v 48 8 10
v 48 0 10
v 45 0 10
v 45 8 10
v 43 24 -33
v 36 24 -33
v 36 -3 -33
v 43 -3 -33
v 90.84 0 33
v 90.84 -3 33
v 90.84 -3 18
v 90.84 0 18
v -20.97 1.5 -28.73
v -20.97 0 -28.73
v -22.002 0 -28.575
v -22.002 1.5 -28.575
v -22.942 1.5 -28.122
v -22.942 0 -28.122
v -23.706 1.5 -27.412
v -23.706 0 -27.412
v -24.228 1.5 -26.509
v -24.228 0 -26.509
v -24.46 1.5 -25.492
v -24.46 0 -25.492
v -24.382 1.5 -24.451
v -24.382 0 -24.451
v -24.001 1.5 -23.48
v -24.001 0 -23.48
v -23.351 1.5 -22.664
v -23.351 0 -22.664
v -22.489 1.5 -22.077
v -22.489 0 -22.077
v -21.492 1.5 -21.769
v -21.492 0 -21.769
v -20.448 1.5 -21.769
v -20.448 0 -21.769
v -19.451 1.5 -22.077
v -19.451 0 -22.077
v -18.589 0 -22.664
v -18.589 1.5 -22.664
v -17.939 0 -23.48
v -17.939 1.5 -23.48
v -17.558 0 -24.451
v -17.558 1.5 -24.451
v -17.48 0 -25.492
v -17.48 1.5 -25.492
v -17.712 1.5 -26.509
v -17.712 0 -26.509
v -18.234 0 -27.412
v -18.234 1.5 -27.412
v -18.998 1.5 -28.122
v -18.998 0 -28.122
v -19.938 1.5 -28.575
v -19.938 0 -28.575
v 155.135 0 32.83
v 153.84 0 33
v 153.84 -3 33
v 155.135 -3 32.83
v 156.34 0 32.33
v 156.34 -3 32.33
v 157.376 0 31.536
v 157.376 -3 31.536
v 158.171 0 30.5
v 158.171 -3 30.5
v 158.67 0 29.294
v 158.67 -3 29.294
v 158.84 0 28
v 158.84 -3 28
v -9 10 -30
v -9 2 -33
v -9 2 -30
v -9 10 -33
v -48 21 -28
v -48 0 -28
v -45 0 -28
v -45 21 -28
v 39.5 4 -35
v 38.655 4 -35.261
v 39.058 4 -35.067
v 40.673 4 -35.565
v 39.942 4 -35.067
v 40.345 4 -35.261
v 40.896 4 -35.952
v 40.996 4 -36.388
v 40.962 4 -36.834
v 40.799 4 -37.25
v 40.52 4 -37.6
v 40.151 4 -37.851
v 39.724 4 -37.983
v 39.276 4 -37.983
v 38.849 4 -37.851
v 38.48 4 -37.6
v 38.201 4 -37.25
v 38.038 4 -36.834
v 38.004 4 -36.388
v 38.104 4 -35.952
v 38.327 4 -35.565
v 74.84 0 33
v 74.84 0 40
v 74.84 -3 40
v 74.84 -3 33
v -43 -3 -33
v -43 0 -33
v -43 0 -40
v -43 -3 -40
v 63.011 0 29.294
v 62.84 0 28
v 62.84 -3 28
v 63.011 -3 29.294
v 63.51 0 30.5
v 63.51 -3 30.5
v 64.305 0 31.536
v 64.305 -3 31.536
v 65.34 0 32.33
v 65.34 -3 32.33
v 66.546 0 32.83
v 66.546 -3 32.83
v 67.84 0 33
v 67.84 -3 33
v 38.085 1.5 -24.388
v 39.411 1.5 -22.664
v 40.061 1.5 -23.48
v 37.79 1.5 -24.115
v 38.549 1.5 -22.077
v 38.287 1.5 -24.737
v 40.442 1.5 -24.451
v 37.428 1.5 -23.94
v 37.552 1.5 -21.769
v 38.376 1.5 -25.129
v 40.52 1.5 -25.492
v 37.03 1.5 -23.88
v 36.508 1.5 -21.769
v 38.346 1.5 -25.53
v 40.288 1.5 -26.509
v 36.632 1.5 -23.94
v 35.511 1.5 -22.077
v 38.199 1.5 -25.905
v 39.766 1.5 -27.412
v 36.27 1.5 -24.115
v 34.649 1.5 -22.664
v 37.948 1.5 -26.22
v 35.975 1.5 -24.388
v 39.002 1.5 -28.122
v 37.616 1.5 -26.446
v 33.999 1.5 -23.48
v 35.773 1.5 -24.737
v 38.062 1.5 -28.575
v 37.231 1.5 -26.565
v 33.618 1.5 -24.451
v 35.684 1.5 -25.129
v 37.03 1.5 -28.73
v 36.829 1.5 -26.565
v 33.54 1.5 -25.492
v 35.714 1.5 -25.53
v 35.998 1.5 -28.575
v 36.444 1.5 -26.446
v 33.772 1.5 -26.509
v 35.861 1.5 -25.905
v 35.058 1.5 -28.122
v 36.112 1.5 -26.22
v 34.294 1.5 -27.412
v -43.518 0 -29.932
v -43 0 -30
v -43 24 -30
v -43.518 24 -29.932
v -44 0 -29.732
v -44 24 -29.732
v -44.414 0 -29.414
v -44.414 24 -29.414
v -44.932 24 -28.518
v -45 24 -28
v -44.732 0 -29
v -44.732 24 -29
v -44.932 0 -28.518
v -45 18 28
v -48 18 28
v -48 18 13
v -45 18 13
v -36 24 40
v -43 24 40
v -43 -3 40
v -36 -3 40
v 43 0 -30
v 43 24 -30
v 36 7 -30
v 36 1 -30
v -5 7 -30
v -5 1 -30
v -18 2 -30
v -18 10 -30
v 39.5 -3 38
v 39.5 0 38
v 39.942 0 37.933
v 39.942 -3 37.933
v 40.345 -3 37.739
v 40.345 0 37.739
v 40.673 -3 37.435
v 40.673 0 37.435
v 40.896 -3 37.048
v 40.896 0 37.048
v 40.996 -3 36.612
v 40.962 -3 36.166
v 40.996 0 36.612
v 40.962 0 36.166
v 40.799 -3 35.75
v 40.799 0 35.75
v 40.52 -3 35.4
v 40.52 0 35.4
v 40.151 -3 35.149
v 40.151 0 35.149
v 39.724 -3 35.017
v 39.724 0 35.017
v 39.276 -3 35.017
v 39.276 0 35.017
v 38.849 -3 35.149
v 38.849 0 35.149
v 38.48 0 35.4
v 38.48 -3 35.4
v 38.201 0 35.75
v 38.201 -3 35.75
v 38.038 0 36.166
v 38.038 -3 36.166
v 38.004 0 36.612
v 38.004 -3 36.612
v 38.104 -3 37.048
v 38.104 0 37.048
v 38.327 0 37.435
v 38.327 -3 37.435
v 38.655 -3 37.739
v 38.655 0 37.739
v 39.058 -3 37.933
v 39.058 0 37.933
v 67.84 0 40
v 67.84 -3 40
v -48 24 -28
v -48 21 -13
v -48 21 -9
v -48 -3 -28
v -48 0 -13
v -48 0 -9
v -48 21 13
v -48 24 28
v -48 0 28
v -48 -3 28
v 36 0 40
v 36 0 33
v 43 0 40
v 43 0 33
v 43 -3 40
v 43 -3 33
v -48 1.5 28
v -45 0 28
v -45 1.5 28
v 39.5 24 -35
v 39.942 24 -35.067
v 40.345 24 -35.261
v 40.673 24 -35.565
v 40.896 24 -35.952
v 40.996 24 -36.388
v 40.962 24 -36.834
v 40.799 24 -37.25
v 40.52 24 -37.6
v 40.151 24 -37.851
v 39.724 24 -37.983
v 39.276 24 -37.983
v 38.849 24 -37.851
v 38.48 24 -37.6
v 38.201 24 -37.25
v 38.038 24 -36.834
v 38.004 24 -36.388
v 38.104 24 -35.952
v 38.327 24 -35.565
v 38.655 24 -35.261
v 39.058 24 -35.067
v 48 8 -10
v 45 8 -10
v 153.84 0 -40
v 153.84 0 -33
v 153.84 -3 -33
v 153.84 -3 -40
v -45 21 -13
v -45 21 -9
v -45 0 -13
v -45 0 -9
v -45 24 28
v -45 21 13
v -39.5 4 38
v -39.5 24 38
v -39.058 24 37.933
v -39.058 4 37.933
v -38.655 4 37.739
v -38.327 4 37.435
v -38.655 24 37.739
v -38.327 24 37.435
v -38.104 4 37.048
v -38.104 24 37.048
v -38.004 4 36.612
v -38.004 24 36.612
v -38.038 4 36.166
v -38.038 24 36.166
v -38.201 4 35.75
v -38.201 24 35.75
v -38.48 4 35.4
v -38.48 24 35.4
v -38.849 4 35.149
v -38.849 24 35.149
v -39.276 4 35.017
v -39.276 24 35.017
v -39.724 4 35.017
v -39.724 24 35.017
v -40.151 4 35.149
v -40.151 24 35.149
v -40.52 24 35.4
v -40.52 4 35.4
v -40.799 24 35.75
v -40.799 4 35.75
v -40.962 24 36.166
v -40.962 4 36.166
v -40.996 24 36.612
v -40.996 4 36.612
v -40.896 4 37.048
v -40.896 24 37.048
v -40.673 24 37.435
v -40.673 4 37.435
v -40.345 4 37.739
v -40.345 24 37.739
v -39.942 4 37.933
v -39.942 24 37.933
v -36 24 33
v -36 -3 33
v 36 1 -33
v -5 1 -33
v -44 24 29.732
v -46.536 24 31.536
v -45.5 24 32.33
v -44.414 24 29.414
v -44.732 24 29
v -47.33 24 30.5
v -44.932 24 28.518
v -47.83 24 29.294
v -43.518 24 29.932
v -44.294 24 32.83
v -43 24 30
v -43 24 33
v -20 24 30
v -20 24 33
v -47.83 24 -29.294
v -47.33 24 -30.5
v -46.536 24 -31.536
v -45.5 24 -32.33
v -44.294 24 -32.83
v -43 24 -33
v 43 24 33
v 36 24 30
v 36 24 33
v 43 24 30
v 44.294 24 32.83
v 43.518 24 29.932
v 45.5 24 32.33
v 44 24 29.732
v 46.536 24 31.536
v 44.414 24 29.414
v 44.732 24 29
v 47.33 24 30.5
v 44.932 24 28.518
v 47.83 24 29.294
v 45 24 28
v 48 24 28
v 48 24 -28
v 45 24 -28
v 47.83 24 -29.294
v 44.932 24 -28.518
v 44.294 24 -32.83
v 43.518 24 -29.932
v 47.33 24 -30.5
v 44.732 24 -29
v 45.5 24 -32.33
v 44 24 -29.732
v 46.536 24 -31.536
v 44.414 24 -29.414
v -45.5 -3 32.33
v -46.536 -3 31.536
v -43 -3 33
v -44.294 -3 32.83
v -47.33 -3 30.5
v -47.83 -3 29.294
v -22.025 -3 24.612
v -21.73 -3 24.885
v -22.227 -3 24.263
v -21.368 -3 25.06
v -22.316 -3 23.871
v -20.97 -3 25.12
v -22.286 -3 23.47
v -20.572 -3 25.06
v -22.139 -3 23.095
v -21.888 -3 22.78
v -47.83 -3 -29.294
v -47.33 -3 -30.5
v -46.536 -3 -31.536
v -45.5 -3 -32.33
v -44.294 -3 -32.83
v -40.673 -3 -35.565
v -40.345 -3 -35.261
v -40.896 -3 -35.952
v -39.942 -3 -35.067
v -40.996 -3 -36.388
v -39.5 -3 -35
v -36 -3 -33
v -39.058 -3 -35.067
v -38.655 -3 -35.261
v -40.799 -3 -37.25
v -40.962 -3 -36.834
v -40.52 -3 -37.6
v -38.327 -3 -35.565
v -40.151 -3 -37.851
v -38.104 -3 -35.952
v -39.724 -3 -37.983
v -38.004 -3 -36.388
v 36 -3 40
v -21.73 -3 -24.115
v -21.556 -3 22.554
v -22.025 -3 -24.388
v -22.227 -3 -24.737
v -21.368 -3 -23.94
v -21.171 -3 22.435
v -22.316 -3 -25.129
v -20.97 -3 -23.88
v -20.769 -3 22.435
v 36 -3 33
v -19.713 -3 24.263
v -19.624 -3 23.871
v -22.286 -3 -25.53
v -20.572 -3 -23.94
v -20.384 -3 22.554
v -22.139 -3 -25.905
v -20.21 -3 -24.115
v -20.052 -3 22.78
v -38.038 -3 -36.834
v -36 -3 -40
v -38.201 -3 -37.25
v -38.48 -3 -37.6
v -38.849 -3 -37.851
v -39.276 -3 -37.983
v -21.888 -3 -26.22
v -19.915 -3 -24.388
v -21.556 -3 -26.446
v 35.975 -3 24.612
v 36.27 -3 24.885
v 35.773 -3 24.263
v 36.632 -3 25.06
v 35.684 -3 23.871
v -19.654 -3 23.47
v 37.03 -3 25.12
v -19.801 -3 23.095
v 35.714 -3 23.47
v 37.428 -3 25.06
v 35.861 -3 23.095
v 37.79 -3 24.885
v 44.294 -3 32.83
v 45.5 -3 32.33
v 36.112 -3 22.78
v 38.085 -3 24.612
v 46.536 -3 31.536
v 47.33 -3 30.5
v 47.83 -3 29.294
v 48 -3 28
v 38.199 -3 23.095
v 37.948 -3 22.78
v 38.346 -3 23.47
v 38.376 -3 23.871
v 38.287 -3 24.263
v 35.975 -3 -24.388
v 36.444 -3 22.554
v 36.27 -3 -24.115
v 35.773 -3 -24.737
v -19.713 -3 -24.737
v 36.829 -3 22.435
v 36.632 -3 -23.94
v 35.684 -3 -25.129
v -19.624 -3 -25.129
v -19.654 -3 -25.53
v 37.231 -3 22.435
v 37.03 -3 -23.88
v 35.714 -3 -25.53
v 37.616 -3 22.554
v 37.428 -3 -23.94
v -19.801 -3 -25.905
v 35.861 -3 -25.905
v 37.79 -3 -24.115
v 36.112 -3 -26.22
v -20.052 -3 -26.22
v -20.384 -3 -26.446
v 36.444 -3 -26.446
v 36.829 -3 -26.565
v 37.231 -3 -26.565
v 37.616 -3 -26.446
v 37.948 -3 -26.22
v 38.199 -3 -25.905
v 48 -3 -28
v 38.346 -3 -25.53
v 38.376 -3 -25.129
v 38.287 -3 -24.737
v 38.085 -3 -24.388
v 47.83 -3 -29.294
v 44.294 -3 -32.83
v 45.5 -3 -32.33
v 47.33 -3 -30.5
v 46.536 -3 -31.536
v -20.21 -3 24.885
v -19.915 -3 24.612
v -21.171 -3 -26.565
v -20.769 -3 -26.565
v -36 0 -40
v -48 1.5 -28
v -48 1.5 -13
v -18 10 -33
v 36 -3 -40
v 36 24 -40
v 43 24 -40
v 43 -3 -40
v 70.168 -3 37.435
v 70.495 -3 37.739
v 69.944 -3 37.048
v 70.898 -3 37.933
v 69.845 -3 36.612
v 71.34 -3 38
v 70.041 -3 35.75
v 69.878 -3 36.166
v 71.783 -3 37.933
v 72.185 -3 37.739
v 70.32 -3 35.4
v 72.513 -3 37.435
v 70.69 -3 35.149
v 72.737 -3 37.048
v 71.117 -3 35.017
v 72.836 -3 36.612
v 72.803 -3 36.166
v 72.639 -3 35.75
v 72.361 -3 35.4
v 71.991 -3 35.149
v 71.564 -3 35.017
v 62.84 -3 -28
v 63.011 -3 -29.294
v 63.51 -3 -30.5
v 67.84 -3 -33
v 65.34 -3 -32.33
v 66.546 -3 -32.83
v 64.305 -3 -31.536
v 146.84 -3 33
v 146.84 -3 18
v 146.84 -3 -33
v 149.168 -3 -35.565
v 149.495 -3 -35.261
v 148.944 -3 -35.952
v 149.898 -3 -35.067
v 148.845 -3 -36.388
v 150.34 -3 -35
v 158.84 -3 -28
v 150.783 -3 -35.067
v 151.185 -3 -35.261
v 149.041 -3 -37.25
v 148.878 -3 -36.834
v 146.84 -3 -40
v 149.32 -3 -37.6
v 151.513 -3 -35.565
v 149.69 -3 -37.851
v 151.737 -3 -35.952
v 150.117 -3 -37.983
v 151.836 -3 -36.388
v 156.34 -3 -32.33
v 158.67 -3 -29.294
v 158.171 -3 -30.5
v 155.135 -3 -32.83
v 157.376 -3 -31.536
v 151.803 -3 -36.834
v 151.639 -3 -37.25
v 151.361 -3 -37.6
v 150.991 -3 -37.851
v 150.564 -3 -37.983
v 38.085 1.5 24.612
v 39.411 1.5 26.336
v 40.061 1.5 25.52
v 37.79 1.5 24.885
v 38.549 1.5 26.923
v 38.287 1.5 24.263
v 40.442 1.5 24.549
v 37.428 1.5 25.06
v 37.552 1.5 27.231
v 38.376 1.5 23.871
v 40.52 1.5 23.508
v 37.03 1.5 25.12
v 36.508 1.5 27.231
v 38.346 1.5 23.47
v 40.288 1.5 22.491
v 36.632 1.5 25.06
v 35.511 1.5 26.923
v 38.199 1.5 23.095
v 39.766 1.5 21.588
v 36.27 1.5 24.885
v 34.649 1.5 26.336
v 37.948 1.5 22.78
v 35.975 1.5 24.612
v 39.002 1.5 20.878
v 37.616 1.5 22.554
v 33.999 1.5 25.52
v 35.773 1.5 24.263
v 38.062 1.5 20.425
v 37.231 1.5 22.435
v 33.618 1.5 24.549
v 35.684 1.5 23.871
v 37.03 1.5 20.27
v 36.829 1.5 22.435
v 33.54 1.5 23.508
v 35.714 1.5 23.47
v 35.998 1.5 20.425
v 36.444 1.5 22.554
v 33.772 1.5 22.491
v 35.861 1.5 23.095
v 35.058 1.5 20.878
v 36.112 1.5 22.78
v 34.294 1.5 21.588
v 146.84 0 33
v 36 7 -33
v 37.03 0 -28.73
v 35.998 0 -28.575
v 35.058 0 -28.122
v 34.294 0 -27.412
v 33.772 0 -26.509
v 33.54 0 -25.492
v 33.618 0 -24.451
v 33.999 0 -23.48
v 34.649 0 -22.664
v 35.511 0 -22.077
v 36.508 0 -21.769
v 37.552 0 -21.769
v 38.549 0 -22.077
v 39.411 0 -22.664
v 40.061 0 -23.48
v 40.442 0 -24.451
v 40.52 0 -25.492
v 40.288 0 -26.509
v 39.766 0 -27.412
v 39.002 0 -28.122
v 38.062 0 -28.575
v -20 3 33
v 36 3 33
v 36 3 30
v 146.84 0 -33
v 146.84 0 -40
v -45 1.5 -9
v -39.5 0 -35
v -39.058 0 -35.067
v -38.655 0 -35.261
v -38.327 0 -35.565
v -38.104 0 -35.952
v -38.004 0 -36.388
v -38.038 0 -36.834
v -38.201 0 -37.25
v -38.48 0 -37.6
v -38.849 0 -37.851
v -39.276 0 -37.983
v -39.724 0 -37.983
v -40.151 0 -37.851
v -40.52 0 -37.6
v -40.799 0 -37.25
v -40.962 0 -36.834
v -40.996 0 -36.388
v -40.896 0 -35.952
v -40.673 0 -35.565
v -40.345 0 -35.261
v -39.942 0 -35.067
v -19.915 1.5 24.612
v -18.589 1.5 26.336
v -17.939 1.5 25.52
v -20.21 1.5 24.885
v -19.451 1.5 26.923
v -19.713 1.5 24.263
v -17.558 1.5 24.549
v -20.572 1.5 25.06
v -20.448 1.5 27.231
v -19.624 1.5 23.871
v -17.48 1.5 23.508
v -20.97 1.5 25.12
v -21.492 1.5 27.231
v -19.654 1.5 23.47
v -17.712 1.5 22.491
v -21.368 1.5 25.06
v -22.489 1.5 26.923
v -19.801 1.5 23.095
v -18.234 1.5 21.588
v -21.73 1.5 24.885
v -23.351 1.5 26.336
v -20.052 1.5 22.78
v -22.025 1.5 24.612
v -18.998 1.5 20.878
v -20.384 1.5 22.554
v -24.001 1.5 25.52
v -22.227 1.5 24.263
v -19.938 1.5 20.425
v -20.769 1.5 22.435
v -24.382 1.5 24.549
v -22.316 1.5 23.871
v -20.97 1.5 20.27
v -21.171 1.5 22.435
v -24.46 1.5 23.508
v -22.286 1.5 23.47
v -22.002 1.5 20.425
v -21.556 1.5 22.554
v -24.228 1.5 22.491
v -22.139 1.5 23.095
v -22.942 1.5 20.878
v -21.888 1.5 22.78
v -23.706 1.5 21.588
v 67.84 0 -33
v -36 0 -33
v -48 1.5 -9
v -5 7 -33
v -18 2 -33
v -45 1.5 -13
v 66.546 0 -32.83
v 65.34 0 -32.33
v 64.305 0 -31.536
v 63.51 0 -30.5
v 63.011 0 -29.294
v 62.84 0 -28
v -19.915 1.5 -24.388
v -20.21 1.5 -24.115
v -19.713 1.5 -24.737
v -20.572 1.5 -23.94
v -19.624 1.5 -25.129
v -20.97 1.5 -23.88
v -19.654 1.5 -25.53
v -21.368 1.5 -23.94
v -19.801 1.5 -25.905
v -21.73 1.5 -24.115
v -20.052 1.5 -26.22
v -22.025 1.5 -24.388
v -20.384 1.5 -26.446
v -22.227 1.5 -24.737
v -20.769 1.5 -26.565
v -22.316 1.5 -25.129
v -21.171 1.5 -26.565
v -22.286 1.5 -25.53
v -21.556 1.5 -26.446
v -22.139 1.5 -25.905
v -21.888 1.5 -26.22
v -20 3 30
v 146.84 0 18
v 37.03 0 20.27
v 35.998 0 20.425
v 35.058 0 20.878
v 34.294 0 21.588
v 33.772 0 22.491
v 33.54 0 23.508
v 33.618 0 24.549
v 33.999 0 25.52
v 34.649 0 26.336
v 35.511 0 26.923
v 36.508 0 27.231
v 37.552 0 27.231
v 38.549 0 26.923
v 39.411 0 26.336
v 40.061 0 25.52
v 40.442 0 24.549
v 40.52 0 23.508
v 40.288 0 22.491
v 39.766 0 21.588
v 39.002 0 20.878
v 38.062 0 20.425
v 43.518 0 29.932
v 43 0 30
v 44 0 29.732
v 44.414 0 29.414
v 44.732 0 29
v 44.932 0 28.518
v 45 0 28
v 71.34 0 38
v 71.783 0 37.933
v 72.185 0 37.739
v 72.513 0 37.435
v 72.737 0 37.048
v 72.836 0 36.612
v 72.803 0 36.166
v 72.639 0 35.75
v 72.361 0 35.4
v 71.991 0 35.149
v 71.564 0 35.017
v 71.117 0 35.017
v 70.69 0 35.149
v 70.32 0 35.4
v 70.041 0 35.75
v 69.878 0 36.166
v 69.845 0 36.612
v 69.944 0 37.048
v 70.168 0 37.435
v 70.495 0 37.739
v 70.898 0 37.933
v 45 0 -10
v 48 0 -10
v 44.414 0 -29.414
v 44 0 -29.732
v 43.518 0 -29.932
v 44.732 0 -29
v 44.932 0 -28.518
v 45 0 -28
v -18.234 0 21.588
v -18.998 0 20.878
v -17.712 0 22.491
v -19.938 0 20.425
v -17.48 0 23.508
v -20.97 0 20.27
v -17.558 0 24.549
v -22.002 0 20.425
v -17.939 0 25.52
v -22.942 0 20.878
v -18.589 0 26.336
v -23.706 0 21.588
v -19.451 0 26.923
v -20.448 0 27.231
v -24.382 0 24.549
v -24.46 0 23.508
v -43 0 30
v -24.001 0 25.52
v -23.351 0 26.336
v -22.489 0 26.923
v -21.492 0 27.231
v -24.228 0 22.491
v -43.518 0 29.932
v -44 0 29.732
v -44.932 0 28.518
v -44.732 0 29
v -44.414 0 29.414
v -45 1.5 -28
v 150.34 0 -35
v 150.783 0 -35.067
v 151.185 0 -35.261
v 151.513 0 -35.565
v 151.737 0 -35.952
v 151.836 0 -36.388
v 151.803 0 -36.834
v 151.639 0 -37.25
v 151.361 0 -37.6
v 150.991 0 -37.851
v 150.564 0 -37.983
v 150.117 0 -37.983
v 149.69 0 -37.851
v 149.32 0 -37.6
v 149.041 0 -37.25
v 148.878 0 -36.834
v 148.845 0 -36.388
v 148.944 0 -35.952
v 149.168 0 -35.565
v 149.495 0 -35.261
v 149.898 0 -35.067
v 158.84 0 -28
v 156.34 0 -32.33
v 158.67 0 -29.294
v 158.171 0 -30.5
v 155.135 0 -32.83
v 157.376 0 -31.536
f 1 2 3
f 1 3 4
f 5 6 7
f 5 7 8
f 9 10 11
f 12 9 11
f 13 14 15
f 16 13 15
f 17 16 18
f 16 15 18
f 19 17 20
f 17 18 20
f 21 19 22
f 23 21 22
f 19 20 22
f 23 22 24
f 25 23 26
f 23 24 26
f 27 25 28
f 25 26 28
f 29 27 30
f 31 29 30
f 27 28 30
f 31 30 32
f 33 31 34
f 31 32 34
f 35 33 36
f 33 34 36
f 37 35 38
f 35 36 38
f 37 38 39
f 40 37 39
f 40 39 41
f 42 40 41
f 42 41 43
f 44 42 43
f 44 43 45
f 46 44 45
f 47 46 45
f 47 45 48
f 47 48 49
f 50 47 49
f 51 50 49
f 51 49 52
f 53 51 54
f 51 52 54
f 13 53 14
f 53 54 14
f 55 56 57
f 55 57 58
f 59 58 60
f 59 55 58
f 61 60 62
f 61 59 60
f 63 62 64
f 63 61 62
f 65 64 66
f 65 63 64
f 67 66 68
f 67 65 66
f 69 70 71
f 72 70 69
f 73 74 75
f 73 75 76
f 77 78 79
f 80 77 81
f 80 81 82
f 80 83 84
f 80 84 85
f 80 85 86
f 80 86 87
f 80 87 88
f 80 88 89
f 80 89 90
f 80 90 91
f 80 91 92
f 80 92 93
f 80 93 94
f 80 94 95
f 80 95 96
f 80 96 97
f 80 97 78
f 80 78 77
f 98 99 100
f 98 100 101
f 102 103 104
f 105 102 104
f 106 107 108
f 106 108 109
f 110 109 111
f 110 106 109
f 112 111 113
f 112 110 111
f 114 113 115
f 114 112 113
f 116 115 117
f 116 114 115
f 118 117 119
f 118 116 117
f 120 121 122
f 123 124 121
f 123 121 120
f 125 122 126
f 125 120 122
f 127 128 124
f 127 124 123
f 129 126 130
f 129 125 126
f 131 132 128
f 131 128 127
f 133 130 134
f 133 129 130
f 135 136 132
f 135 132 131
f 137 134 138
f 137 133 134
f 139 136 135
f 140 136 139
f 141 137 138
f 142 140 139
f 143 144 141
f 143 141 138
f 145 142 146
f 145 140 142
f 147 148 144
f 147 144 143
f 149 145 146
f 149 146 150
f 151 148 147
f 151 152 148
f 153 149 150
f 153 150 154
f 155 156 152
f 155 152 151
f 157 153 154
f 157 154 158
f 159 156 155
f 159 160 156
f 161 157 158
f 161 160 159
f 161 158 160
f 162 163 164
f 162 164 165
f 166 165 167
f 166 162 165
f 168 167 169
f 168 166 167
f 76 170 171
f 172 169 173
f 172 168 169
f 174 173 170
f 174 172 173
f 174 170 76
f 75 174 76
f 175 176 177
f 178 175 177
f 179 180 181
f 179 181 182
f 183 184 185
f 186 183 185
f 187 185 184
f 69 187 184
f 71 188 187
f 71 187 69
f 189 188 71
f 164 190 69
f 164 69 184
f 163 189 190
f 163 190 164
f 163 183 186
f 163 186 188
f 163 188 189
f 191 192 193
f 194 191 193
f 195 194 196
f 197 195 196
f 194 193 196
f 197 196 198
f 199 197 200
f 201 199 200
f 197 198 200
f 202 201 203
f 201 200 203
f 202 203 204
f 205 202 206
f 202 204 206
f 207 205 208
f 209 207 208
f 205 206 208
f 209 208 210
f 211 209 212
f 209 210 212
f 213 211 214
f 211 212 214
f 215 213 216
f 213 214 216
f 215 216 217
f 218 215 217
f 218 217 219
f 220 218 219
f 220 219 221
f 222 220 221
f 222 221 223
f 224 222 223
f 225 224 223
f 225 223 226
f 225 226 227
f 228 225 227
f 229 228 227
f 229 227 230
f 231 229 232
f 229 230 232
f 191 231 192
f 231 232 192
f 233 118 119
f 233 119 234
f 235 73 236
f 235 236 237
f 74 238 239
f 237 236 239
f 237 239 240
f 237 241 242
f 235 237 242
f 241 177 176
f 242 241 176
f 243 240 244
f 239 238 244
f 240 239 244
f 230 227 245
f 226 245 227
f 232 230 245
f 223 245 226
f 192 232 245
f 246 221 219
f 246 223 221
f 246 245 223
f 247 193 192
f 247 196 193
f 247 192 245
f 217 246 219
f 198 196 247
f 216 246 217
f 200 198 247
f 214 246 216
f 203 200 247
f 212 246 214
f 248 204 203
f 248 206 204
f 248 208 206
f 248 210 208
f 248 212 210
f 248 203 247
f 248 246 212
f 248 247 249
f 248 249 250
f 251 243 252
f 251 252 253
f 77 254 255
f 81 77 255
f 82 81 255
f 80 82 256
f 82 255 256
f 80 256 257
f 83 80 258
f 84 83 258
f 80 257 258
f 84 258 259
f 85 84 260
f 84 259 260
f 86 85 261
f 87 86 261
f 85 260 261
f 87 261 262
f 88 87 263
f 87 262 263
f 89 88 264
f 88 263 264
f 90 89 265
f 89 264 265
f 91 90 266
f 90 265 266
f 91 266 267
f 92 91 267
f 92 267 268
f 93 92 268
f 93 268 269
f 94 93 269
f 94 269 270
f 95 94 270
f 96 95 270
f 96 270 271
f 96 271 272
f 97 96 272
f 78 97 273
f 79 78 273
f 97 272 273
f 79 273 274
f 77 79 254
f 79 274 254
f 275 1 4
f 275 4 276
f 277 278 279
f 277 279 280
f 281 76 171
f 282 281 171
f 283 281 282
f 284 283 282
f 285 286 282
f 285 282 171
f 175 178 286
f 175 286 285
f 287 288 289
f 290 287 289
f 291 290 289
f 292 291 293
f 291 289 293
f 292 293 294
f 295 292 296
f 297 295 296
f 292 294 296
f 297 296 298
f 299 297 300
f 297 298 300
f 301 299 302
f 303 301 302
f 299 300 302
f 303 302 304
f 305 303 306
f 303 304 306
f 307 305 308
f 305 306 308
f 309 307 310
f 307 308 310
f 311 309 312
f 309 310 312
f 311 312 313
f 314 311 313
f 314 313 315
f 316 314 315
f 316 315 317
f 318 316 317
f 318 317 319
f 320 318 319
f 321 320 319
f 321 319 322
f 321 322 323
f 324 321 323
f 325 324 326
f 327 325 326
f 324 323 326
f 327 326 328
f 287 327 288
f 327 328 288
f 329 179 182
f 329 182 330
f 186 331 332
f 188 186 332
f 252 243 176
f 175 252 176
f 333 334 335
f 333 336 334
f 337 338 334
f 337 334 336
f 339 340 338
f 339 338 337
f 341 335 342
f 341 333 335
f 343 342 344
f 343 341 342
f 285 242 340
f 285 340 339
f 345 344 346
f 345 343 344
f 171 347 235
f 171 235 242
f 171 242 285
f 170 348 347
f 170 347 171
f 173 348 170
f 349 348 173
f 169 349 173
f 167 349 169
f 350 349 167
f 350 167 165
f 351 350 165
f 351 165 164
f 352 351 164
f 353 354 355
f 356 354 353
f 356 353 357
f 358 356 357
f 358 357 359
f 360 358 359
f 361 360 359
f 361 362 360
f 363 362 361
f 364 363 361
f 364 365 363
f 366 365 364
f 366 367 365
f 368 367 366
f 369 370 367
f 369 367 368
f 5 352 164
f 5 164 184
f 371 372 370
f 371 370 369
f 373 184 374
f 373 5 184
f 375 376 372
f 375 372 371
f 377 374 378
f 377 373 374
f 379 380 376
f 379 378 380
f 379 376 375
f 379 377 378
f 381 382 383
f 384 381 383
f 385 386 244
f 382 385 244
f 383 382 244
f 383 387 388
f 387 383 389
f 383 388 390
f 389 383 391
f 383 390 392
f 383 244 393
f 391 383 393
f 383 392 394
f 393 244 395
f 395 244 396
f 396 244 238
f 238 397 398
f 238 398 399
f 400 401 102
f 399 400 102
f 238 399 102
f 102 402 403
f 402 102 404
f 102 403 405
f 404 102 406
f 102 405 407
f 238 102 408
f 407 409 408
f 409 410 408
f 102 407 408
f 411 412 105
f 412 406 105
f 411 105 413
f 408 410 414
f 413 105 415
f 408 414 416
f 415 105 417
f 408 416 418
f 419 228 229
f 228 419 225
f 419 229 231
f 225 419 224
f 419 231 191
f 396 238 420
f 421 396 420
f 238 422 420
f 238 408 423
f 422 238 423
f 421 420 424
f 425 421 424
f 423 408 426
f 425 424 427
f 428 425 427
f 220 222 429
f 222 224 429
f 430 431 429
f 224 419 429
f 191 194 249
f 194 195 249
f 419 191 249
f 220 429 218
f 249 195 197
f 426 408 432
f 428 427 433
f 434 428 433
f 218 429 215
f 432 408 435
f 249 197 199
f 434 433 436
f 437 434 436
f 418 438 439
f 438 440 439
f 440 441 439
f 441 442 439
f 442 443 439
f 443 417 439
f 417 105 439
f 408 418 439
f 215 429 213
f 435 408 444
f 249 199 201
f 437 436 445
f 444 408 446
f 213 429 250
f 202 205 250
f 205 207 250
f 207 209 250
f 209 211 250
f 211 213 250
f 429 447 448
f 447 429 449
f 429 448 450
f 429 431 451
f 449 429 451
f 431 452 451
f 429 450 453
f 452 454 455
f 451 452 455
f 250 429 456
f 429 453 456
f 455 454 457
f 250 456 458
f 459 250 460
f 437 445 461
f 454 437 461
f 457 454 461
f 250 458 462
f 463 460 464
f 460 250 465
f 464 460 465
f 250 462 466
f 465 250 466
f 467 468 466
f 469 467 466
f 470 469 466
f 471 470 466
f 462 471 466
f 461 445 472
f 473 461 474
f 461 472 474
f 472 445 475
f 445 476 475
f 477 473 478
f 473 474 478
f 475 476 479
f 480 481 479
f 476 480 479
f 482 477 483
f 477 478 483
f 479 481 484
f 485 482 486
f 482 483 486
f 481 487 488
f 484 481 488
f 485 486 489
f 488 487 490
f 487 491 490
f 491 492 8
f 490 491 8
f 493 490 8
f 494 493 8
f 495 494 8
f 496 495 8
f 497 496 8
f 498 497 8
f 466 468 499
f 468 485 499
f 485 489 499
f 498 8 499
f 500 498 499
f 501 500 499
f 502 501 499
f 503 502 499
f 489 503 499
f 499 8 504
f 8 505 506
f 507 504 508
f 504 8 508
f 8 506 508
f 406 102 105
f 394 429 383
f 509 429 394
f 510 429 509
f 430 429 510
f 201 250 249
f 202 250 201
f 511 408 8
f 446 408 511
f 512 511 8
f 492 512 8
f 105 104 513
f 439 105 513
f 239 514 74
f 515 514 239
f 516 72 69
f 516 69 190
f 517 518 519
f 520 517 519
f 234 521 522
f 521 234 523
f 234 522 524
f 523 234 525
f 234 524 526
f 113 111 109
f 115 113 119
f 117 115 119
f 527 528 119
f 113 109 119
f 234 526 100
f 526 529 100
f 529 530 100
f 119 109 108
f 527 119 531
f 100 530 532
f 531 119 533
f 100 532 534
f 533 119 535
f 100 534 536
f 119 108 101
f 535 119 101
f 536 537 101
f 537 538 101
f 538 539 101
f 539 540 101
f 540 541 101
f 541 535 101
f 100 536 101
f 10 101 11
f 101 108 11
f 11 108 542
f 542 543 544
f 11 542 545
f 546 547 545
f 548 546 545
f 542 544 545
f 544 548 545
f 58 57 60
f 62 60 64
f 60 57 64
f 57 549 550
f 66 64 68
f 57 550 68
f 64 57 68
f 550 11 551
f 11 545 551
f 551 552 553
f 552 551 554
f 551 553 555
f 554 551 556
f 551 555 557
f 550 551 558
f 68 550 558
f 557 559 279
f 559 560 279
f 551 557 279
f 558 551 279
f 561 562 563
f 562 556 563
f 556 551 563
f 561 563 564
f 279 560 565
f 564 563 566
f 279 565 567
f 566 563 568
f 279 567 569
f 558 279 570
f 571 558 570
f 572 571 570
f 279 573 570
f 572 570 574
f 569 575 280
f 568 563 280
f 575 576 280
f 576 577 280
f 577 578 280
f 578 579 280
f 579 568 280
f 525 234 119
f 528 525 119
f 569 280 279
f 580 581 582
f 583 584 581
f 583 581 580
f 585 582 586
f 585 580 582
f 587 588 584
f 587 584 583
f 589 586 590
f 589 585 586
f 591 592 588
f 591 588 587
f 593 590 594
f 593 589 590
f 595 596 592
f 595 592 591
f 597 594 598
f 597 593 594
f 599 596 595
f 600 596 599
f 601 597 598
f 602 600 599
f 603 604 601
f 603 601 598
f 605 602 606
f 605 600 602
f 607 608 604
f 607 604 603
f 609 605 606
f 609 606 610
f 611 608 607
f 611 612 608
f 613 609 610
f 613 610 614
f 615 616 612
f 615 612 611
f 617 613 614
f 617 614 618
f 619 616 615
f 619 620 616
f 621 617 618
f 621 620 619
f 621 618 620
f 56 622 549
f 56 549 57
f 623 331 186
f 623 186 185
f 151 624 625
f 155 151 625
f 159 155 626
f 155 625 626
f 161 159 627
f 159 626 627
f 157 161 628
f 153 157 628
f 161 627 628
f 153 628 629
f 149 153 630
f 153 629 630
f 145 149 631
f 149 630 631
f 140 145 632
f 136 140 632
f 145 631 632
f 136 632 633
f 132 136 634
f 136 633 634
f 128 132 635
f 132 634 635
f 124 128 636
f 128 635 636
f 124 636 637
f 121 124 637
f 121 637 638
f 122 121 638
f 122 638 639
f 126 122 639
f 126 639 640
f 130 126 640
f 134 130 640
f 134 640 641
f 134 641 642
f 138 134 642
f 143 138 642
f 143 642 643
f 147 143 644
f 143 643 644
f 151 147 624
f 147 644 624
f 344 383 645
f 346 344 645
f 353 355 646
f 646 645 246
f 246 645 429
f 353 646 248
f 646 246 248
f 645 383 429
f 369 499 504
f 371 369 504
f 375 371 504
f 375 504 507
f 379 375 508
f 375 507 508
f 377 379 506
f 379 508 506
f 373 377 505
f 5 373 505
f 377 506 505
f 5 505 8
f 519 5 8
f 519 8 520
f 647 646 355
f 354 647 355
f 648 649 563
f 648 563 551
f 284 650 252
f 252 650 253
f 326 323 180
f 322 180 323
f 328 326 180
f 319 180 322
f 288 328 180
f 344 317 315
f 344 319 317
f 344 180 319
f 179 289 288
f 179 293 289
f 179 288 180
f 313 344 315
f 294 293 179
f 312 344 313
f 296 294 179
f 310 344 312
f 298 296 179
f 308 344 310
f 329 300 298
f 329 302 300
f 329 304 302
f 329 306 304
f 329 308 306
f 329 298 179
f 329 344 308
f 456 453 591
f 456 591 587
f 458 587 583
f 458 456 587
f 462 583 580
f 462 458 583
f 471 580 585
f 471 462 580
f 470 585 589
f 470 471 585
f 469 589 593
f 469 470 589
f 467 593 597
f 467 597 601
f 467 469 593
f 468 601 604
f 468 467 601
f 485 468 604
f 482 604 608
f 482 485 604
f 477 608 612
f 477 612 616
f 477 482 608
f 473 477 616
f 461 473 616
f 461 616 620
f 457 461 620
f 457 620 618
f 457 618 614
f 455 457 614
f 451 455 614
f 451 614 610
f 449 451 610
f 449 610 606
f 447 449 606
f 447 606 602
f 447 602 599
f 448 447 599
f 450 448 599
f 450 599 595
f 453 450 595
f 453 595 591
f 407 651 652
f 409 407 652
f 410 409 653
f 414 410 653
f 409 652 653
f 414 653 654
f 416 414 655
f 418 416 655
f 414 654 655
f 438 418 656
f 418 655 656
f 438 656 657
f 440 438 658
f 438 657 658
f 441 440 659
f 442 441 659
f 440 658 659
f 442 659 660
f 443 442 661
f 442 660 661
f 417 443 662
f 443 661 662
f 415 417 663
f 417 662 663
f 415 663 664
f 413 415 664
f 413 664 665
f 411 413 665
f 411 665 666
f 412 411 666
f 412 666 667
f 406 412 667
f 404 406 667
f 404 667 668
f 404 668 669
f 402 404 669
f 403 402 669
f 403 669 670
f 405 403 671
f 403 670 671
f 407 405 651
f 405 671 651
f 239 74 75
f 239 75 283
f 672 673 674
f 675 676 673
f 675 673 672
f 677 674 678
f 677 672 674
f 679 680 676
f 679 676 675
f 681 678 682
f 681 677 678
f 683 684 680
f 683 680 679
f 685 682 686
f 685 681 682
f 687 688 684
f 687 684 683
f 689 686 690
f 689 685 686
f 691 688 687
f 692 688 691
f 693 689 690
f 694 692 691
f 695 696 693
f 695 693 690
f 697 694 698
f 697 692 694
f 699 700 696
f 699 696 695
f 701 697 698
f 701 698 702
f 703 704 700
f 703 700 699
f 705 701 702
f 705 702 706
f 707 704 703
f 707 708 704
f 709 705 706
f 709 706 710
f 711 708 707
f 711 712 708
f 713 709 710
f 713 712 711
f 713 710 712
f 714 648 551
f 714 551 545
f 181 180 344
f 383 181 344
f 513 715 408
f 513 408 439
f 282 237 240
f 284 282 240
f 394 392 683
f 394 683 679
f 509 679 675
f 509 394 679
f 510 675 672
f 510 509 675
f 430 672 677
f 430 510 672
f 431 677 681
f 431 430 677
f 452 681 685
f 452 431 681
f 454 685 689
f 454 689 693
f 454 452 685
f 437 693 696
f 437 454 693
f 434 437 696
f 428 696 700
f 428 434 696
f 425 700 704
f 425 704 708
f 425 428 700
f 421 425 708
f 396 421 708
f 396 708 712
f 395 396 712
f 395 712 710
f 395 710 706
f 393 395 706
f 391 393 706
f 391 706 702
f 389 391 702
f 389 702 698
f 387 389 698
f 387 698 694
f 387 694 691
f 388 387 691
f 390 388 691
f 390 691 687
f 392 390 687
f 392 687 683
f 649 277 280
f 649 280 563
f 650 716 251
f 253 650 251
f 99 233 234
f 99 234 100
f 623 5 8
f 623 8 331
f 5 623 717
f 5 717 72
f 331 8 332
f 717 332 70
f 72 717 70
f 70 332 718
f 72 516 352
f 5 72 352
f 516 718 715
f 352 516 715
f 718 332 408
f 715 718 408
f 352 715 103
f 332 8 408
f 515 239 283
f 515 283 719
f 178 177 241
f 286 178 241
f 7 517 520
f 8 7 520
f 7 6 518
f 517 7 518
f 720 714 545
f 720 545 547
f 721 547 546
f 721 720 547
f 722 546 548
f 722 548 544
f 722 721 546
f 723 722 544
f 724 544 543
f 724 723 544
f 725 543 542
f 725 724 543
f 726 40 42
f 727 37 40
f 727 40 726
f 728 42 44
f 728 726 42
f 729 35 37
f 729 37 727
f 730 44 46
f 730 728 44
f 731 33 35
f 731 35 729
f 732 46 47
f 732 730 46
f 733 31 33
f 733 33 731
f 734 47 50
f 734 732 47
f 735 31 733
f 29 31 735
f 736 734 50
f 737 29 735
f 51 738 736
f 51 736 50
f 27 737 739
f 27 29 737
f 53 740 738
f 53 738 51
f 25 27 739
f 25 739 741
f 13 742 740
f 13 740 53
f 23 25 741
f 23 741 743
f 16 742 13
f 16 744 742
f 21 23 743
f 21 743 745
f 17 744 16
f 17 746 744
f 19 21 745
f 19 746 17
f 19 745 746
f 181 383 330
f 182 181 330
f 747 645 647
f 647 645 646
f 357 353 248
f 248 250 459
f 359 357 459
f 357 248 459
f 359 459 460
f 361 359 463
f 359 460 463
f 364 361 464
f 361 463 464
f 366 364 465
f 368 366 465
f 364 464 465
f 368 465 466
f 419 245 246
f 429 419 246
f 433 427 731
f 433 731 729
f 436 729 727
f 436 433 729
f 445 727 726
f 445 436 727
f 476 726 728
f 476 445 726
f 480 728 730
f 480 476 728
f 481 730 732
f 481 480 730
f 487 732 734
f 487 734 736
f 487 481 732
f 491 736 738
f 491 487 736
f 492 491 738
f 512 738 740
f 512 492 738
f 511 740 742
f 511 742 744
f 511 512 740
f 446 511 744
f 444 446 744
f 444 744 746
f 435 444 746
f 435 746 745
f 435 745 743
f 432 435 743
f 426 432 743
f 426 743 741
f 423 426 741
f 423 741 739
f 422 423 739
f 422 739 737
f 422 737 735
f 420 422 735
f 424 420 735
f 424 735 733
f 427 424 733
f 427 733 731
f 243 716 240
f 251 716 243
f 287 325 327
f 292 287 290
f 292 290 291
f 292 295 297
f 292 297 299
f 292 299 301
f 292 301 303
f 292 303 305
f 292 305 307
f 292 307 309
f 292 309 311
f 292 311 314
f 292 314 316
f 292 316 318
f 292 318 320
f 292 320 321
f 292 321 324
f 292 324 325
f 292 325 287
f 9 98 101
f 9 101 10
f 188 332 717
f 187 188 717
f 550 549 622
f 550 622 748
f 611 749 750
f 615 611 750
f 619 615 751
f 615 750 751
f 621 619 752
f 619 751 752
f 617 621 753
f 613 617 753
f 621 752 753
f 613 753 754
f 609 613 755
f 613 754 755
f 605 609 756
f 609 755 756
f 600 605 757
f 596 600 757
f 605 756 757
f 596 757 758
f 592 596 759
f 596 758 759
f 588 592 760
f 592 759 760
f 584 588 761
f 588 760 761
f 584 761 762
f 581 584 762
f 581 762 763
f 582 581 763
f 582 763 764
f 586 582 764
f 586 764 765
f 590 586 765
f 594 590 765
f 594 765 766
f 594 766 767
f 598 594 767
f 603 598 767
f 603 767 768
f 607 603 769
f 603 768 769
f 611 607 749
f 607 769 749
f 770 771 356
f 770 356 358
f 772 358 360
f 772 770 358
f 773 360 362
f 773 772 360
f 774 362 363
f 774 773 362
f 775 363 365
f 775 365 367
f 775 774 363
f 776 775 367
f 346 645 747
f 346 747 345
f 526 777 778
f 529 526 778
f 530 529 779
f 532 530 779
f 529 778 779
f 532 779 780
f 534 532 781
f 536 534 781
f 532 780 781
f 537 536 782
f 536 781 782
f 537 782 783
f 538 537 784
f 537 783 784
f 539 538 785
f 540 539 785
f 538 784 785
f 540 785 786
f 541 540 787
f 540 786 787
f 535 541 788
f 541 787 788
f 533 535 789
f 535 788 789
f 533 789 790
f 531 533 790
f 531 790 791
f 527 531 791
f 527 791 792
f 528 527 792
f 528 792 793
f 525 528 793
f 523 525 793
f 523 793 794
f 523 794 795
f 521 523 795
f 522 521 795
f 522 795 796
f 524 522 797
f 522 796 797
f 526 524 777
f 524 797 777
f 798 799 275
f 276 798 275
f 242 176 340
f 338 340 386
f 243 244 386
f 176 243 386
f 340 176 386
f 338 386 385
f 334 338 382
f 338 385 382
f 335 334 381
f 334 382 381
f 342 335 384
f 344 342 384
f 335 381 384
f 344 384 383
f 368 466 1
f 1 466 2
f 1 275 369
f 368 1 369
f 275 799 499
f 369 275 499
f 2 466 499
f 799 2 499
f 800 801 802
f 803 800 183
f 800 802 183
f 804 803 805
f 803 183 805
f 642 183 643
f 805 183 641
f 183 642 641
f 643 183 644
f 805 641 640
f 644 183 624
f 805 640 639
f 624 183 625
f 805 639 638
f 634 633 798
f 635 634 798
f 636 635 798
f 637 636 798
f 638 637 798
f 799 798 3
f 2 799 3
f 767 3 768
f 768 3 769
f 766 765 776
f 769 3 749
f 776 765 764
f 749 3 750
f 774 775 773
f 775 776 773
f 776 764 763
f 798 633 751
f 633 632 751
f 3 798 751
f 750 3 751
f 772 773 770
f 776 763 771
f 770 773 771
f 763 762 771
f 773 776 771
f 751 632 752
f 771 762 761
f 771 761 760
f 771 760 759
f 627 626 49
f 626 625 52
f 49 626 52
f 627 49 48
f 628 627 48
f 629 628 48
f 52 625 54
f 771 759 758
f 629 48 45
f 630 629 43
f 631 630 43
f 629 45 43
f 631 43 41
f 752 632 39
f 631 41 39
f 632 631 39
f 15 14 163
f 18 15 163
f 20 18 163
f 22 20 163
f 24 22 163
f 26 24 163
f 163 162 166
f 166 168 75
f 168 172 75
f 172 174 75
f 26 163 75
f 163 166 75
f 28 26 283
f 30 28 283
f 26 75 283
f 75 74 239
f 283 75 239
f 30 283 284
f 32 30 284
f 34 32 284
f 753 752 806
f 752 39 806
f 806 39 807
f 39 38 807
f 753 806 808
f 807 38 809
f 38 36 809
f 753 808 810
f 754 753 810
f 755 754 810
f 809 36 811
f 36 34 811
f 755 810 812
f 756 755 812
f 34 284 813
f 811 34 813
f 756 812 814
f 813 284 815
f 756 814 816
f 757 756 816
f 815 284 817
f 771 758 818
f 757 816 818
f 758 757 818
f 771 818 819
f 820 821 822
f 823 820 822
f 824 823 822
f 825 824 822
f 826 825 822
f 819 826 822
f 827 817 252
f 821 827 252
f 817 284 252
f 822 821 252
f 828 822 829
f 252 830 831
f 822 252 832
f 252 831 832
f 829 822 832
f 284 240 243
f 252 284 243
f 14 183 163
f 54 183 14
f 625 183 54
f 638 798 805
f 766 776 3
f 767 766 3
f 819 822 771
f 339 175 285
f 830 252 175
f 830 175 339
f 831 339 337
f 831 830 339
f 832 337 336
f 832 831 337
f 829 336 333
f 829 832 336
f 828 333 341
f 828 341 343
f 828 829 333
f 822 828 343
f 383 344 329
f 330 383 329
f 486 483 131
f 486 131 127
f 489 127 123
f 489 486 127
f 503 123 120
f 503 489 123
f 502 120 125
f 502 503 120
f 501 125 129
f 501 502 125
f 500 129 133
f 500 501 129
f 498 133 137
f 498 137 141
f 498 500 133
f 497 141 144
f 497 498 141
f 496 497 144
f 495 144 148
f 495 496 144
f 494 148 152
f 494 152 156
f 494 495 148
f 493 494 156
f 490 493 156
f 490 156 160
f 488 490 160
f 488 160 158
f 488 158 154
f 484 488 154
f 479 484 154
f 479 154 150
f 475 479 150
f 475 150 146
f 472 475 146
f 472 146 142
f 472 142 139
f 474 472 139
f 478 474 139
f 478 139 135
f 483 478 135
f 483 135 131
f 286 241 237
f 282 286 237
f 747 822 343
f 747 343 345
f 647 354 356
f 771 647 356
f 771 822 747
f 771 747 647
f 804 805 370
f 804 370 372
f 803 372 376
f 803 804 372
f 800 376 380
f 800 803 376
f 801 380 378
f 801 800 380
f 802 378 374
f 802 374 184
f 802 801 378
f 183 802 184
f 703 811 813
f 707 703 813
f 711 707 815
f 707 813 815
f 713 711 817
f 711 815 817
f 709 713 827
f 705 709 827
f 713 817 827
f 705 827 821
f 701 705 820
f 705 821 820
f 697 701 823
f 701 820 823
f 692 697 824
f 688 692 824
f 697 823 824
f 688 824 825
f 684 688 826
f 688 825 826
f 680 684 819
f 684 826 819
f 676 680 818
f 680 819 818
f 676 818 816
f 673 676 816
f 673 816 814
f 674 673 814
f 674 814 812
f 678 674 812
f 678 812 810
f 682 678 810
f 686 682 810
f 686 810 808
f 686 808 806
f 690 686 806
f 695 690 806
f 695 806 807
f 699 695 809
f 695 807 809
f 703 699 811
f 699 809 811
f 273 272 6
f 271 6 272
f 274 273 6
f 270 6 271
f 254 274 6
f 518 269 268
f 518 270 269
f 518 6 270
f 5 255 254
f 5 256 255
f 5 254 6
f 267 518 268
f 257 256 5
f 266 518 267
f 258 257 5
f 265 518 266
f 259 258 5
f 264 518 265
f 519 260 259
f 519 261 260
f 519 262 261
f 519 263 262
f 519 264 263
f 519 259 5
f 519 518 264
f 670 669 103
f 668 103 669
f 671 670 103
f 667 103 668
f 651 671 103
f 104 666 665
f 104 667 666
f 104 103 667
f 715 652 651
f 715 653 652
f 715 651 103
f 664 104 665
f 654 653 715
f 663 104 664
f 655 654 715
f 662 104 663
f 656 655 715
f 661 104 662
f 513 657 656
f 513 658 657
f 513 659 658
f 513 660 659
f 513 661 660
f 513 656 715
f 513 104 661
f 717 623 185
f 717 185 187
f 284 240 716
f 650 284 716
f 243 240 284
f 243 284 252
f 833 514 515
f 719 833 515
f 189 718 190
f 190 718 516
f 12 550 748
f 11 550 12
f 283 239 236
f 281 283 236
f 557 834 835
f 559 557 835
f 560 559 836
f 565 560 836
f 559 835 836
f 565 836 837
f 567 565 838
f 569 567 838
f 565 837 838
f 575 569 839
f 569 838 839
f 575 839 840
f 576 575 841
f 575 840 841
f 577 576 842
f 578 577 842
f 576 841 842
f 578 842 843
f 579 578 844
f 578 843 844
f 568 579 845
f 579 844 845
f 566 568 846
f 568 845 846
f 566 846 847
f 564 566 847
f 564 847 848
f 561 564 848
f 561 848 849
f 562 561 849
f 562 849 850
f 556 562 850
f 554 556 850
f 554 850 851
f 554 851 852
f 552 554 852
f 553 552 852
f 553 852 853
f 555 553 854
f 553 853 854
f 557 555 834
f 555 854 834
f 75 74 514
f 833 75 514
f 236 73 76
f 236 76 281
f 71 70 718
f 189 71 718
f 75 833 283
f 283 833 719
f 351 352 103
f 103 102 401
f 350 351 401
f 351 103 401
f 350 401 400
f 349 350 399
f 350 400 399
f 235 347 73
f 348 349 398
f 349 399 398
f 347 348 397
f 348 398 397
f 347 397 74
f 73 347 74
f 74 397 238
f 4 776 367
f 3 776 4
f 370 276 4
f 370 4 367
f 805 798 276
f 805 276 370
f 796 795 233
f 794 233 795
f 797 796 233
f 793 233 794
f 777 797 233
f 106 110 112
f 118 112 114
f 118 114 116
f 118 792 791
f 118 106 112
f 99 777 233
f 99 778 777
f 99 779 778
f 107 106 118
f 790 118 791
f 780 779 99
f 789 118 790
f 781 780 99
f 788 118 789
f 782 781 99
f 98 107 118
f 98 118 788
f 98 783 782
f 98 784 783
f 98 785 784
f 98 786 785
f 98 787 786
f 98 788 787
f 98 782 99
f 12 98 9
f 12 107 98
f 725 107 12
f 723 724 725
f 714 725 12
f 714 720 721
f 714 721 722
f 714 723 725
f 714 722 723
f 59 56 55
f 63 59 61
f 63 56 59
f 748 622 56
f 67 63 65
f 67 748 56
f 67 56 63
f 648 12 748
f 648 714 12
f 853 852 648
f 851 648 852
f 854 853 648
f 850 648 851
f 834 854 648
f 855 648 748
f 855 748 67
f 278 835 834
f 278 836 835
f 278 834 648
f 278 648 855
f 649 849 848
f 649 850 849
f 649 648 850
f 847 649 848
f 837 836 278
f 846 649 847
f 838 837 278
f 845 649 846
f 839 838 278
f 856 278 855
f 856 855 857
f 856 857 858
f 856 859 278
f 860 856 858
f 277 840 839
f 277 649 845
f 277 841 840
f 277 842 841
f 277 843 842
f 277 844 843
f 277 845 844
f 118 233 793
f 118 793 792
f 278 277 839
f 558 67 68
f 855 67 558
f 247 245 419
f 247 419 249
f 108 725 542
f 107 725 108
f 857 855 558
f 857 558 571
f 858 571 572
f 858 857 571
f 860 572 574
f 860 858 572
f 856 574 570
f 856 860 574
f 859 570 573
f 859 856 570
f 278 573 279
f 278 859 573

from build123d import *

# Parameters (mm, degrees)
EXTRUIR_L_MINA1_DEPTH      = 24
SALIENTE_EXTRUIR1_START    = 3
SALIENTE_EXTRUIR1_DEPTH    = 3
CORTAR_EXTRUIR1_REACH      = 106.312
CROQUIS4_W                 = 15
CROQUIS4_H                 = 21
CORTAR_EXTRUIR2_REACH      = 87.065
CROQUIS5_W                 = 56
CROQUIS5_H                 = 21
CORTAR_EXTRUIR3_REACH      = 87.065
CROQUIS7_W                 = 41
CROQUIS7_H                 = 6
CROQUIS7_W_2               = 9
CROQUIS7_H_2               = 8
CROQUIS8_W                 = 7
CROQUIS8_H                 = 7
SALIENTE_EXTRUIR5_DEPTH    = 27
SALIENTE_EXTRUIR5_2_DEPTH  = 27
CROQUIS10_R                = 1.5
CORTAR_EXTRUIR4_DEPTH      = 20
CROQUIS11_R                = 1.5
SALIENTE_EXTRUIR6_DEPTH    = 3
CROQUIS12_W                = 15
CROQUIS12_H                = 1.5
SALIENTE_EXTRUIR7_DEPTH    = 3
CROQUIS12_W_2              = 37
SALIENTE_EXTRUIR7_2_DEPTH  = 3
CROQUIS13_R                = 3.5
CROQUIS13_R_2              = 1.35
SALIENTE_EXTRUIR8_DEPTH    = 1.5
CORTAR_EXTRUIR5_DEPTH      = 2
CORTAR_EXTRUIR5_DEPTH_BACK = 166.548420234
CROQUIS14_R                = 1.35
CROQUIS15_W                = 56
CROQUIS15_H                = 15
CORTAR_EXTRUIR6_DEPTH      = 167.009877543
CROQUIS16_W                = 7
CROQUIS16_H                = 7
CROQUIS16_R                = 1.5
SALIENTE_EXTRUIR9_DEPTH    = 3
CROQUIS17_W                = 20
CROQUIS17_H                = 8
CORTAR_EXTRUIR7_DEPTH      = 3


with BuildPart() as part:
    # Croquis1 → Extruir-Lámina1 (new body)
    with BuildSketch(Plane(origin=(0, 0, 0), x_dir=(1, 0, 0), z_dir=(0, 1, 0))):
        with BuildLine():
            Line((-48, 28), (-48, -28))
            ThreePointArc((-48, -28), (-46.535533906, -31.535533906), (-43, -33))
            Line((-43, -33), (43, -33))
            ThreePointArc((43, -33), (46.535533906, -31.535533906), (48, -28))
            Line((48, -28), (48, 28))
            ThreePointArc((48, 28), (46.535533906, 31.535533906), (43, 33))
            Line((43, 33), (-43, 33))
            ThreePointArc((-43, 33), (-46.535533906, 31.535533906), (-48, 28))
        make_face()
        with BuildLine():
            Line((-45, 28), (-45, -28))
            ThreePointArc((-45, -28), (-44.414213562, -29.414213562), (-43, -30))
            Line((-43, -30), (43, -30))
            ThreePointArc((43, -30), (44.414213562, -29.414213562), (45, -28))
            Line((45, -28), (45, 28))
            ThreePointArc((45, 28), (44.414213562, 29.414213562), (43, 30))
            Line((43, 30), (-43, 30))
            ThreePointArc((-43, 30), (-44.414213562, 29.414213562), (-45, 28))
        make_face(mode=Mode.SUBTRACT)
    extrude(amount=EXTRUIR_L_MINA1_DEPTH)

    # Croquis3 → Saliente-Extruir1 (add)
    with BuildSketch(Plane.XZ.offset(SALIENTE_EXTRUIR1_START)):
        with BuildLine():
            Line((-43, 33), (43, 33))
            ThreePointArc((43, 33), (46.535533906, 31.535533906), (48, 28))
            Line((48, 28), (48, -28))
            ThreePointArc((48, -28), (46.535533906, -31.535533906), (43, -33))
            Line((43, -33), (-43, -33))
            ThreePointArc((-43, -33), (-46.535533906, -31.535533906), (-48, -28))
            Line((-48, -28), (-48, 28))
            ThreePointArc((-48, 28), (-46.535533906, 31.535533906), (-43, 33))
        make_face()
    extrude(amount=-SALIENTE_EXTRUIR1_DEPTH)

    # Croquis4 → Cortar-Extruir1 (cut, up to next)
    with BuildSketch(Plane.ZY.offset(48), mode=Mode.PRIVATE) as cortar_extruir1_sk1:
        Polygon((28, 0), (28, 18), (13, 18), (13, 21), (-9, 21), (-9, 0), align=None)
    cortar_extruir1_tool1 = extrude(cortar_extruir1_sk1.sketch, amount=-CORTAR_EXTRUIR1_REACH, mode=Mode.PRIVATE) & part.part
    # Croquis4 → Cortar-Extruir1 (cut, up to next)
    with BuildSketch(Plane.ZY.offset(48), mode=Mode.PRIVATE) as cortar_extruir1_sk2:
        with Locations((-20.5, 10.5)):
            Rectangle(CROQUIS4_W, CROQUIS4_H)
    cortar_extruir1_tool2 = extrude(cortar_extruir1_sk2.sketch, amount=-CORTAR_EXTRUIR1_REACH, mode=Mode.PRIVATE) & part.part
    add(cortar_extruir1_tool1.solids().sort_by_distance((-48, 9.946721, 8.82377))[0], mode=Mode.SUBTRACT)
    add(cortar_extruir1_tool2.solids().sort_by_distance((-48, 10.5, -20.5))[0], mode=Mode.SUBTRACT)

    # Croquis5 → Cortar-Extruir2 (cut, up to next)
    with BuildSketch(Plane.XY.offset(33), mode=Mode.PRIVATE) as cortar_extruir2_sk1:
        with Locations((8, 13.5)):
            Rectangle(CROQUIS5_W, CROQUIS5_H)
    cortar_extruir2_tool1 = extrude(cortar_extruir2_sk1.sketch, amount=-CORTAR_EXTRUIR2_REACH, mode=Mode.PRIVATE) & part.part
    add(cortar_extruir2_tool1.solids().sort_by_distance((8, 13.5, 33))[0], mode=Mode.SUBTRACT)

    # Croquis7 → Cortar-Extruir3 (cut, up to next)
    with BuildSketch(Plane(origin=(0, 0, -33), x_dir=(-1, 0, 0), z_dir=(0, 0, -1)), mode=Mode.PRIVATE) as cortar_extruir3_sk1:
        with Locations((-15.5, 4)):
            Rectangle(CROQUIS7_W, CROQUIS7_H)
    cortar_extruir3_tool1 = extrude(cortar_extruir3_sk1.sketch, amount=-CORTAR_EXTRUIR3_REACH, mode=Mode.PRIVATE) & part.part
    # Croquis7 → Cortar-Extruir3 (cut, up to next)
    with BuildSketch(Plane(origin=(0, 0, -33), x_dir=(-1, 0, 0), z_dir=(0, 0, -1)), mode=Mode.PRIVATE) as cortar_extruir3_sk2:
        with Locations((13.5, 6)):
            Rectangle(CROQUIS7_W_2, CROQUIS7_H_2)
    cortar_extruir3_tool2 = extrude(cortar_extruir3_sk2.sketch, amount=-CORTAR_EXTRUIR3_REACH, mode=Mode.PRIVATE) & part.part
    add(cortar_extruir3_tool1.solids().sort_by_distance((15.5, 4, -33))[0], mode=Mode.SUBTRACT)
    add(cortar_extruir3_tool2.solids().sort_by_distance((-13.5, 6, -33))[0], mode=Mode.SUBTRACT)

    # Croquis13 → Saliente-Extruir8 (add)
    # profile 1 of 4: a face of its own
    with BuildSketch(Plane(origin=(0, 0, 0), x_dir=(1, 0, 0), z_dir=(0, 1, 0))):
        with Locations(Location((-20.97, 25.23, 0), (0, 0, 90))):
            Circle(CROQUIS13_R)
        with Locations(Location((-20.97, 25.23, 0), (0, 0, 270))):
            Circle(CROQUIS13_R_2, mode=Mode.SUBTRACT)
    # profile 2 of 4: a face of its own
    with BuildSketch(Plane(origin=(0, 0, 0), x_dir=(1, 0, 0), z_dir=(0, 1, 0))):
        with Locations(Location((37.03, -23.77, 0), (0, 0, 90))):
            Circle(CROQUIS13_R)
        with Locations(Location((37.03, -23.77, 0), (0, 0, 270))):
            Circle(CROQUIS13_R_2, mode=Mode.SUBTRACT)
    # profile 3 of 4: a face of its own
    with BuildSketch(Plane(origin=(0, 0, 0), x_dir=(1, 0, 0), z_dir=(0, 1, 0))):
        with Locations(Location((-20.97, -23.77, 0), (0, 0, 90))):
            Circle(CROQUIS13_R)
        with Locations(Location((-20.97, -23.77, 0), (0, 0, 270))):
            Circle(CROQUIS13_R_2, mode=Mode.SUBTRACT)
    # profile 4 of 4: a face of its own
    with BuildSketch(Plane(origin=(0, 0, 0), x_dir=(1, 0, 0), z_dir=(0, 1, 0))):
        with Locations(Location((37.03, 25.23, 0), (0, 0, 90))):
            Circle(CROQUIS13_R)
        with Locations(Location((37.03, 25.23, 0), (0, 0, 270))):
            Circle(CROQUIS13_R_2, mode=Mode.SUBTRACT)
    extrude(amount=SALIENTE_EXTRUIR8_DEPTH)

    # Croquis14 → Cortar-Extruir5 (cut, two sides: drawn at the far end of the back side and taken through both)
    with BuildSketch(Plane(origin=(0, 0, 0), x_dir=(1, 0, 0), z_dir=(0, 1, 0)).offset(-CORTAR_EXTRUIR5_DEPTH_BACK)):
        with Locations(Location((37.03, -23.77, 0), (0, 0, 270))):
            Circle(CROQUIS14_R)
        with Locations(Location((-20.97, -23.77, 0), (0, 0, 270))):
            Circle(CROQUIS14_R)
        with Locations(Location((37.03, 25.23, 0), (0, 0, 270))):
            Circle(CROQUIS14_R)
        with Locations(Location((-20.97, 25.23, 0), (0, 0, 270))):
            Circle(CROQUIS14_R)
    extrude(amount=CORTAR_EXTRUIR5_DEPTH + CORTAR_EXTRUIR5_DEPTH_BACK, mode=Mode.SUBTRACT)

    # Croquis16 → Saliente-Extruir9 (add)
    # profile 1 of 2: a face of its own
    with BuildSketch(Plane(origin=(0, 0, 0), x_dir=(1, 0, 0), z_dir=(0, 1, 0))):
        with Locations((-39.5, 36.5)):
            Rectangle(CROQUIS16_W, CROQUIS16_H)
        with Locations(Location((-39.5, 36.5, 0), (0, 0, 270))):
            Circle(CROQUIS16_R, mode=Mode.SUBTRACT)
    # profile 2 of 2: a face of its own
    with BuildSketch(Plane(origin=(0, 0, 0), x_dir=(1, 0, 0), z_dir=(0, 1, 0))):
        with Locations((39.5, -36.5)):
            Rectangle(CROQUIS16_W, CROQUIS16_H)
        with Locations(Location((39.5, -36.5, 0), (0, 0, 270))):
            Circle(CROQUIS16_R, mode=Mode.SUBTRACT)
    extrude(amount=-SALIENTE_EXTRUIR9_DEPTH)

    # Croquis17 → Cortar-Extruir7 (cut)
    with BuildSketch(Plane(origin=(48, 0, 0), x_dir=(0, 0, -1), z_dir=(1, 0, 0))):
        with Locations((0, 4)):
            Rectangle(CROQUIS17_W, CROQUIS17_H)
    extrude(amount=-CORTAR_EXTRUIR7_DEPTH, mode=Mode.SUBTRACT)


with BuildPart() as body_2:
    # Croquis8 → Saliente-Extruir5 (new body)
    with BuildSketch(Plane(origin=(0, 24, 0), x_dir=(1, 0, 0), z_dir=(0, 1, 0))):
        with Locations((-39.5, -36.5)):
            Rectangle(CROQUIS8_W, CROQUIS8_H)
    extrude(amount=-SALIENTE_EXTRUIR5_DEPTH)


with BuildPart() as body_3:
    # Croquis8 → Saliente-Extruir5 2 (new body)
    with BuildSketch(Plane(origin=(0, 24, 0), x_dir=(1, 0, 0), z_dir=(0, 1, 0))):
        with Locations((39.5, 36.5)):
            Rectangle(CROQUIS8_W, CROQUIS8_H)
    extrude(amount=-SALIENTE_EXTRUIR5_2_DEPTH)


with BuildPart() as cortar_extruir4_tool:
    # Croquis10 → Cortar-Extruir4 (new body)
    with BuildSketch(Plane(origin=(0, 24, 0), x_dir=(1, 0, 0), z_dir=(0, 1, 0))):
        with Locations(Location((-39.5, -36.5, 0), (0, 0, 270))):
            Circle(CROQUIS10_R)
        with Locations(Location((39.5, 36.5, 0), (0, 0, 270))):
            Circle(CROQUIS10_R)
    extrude(amount=-CORTAR_EXTRUIR4_DEPTH)


with BuildPart() as body_2_1:
    add(body_2.part)

    # Cortar-Extruir4: cut by cortar_extruir4_tool
    add(cortar_extruir4_tool.part, mode=Mode.SUBTRACT)


with BuildPart() as body_3_1:
    add(body_3.part)

    # Cortar-Extruir4: cut by cortar_extruir4_tool
    add(cortar_extruir4_tool.part, mode=Mode.SUBTRACT)


with BuildPart() as body_4:
    # Croquis11 → Saliente-Extruir6 (new body)
    with BuildSketch(Plane(origin=(0, 0, 0), x_dir=(1, 0, 0), z_dir=(0, 1, 0))):
        with BuildLine():
            Line((67.84042131, -33), (67.84042131, -40))
            Line((67.84042131, -40), (74.84042131, -40))
            Line((74.84042131, -40), (74.84042131, -33))
            Line((74.84042131, -33), (150.84042131, -33))
            Line((150.84042131, -33), (153.84042131, -33))
            ThreePointArc((153.84042131, -33), (157.375955216, -31.535533906), (158.84042131, -28))
            Line((158.84042131, -28), (158.84042131, 28))
            ThreePointArc((158.84042131, 28), (157.375955216, 31.535533906), (153.84042131, 33))
            Line((153.84042131, 33), (153.84042131, 40))
            Line((153.84042131, 40), (146.84042131, 40))
            Line((146.84042131, 40), (146.84042131, 33))
            Line((146.84042131, 33), (67.84042131, 33))
            ThreePointArc((67.84042131, 33), (64.304887404, 31.535533906), (62.84042131, 28))
            Line((62.84042131, 28), (62.84042131, -28))
            ThreePointArc((62.84042131, -28), (64.304887404, -31.535533906), (67.84042131, -33))
        make_face()
        with Locations(Location((71.34042131, -36.5, 0), (0, 0, 270))):
            Circle(CROQUIS11_R, mode=Mode.SUBTRACT)
        with Locations(Location((150.34042131, 36.5, 0), (0, 0, 270))):
            Circle(CROQUIS11_R, mode=Mode.SUBTRACT)
    extrude(amount=-SALIENTE_EXTRUIR6_DEPTH)

    # Croquis15 → Cortar-Extruir6 (cut, through all)
    with BuildSketch(Plane(origin=(0, -3, 0), x_dir=(-1, 0, 0), z_dir=(0, -1, 0))):
        with Locations((-118.84042131, -25.5)):
            Rectangle(CROQUIS15_W, CROQUIS15_H)
    extrude(amount=-CORTAR_EXTRUIR6_DEPTH, mode=Mode.SUBTRACT)


with BuildPart() as body_5:
    # Croquis12 → Saliente-Extruir7 (new body)
    with BuildSketch(Plane.ZY.offset(48)):
        with Locations((-20.5, 0.75)):
            Rectangle(CROQUIS12_W, CROQUIS12_H)
    extrude(amount=-SALIENTE_EXTRUIR7_DEPTH)


with BuildPart() as body_6:
    # Croquis12 → Saliente-Extruir7 2 (new body)
    with BuildSketch(Plane.ZY.offset(48)):
        with Locations((9.5, 0.75)):
            Rectangle(CROQUIS12_W_2, CROQUIS12_H)
    extrude(amount=-SALIENTE_EXTRUIR7_2_DEPTH)


solid = Compound([part.part, body_2_1.part, body_3_1.part, body_4.part, body_5.part, body_6.part])
